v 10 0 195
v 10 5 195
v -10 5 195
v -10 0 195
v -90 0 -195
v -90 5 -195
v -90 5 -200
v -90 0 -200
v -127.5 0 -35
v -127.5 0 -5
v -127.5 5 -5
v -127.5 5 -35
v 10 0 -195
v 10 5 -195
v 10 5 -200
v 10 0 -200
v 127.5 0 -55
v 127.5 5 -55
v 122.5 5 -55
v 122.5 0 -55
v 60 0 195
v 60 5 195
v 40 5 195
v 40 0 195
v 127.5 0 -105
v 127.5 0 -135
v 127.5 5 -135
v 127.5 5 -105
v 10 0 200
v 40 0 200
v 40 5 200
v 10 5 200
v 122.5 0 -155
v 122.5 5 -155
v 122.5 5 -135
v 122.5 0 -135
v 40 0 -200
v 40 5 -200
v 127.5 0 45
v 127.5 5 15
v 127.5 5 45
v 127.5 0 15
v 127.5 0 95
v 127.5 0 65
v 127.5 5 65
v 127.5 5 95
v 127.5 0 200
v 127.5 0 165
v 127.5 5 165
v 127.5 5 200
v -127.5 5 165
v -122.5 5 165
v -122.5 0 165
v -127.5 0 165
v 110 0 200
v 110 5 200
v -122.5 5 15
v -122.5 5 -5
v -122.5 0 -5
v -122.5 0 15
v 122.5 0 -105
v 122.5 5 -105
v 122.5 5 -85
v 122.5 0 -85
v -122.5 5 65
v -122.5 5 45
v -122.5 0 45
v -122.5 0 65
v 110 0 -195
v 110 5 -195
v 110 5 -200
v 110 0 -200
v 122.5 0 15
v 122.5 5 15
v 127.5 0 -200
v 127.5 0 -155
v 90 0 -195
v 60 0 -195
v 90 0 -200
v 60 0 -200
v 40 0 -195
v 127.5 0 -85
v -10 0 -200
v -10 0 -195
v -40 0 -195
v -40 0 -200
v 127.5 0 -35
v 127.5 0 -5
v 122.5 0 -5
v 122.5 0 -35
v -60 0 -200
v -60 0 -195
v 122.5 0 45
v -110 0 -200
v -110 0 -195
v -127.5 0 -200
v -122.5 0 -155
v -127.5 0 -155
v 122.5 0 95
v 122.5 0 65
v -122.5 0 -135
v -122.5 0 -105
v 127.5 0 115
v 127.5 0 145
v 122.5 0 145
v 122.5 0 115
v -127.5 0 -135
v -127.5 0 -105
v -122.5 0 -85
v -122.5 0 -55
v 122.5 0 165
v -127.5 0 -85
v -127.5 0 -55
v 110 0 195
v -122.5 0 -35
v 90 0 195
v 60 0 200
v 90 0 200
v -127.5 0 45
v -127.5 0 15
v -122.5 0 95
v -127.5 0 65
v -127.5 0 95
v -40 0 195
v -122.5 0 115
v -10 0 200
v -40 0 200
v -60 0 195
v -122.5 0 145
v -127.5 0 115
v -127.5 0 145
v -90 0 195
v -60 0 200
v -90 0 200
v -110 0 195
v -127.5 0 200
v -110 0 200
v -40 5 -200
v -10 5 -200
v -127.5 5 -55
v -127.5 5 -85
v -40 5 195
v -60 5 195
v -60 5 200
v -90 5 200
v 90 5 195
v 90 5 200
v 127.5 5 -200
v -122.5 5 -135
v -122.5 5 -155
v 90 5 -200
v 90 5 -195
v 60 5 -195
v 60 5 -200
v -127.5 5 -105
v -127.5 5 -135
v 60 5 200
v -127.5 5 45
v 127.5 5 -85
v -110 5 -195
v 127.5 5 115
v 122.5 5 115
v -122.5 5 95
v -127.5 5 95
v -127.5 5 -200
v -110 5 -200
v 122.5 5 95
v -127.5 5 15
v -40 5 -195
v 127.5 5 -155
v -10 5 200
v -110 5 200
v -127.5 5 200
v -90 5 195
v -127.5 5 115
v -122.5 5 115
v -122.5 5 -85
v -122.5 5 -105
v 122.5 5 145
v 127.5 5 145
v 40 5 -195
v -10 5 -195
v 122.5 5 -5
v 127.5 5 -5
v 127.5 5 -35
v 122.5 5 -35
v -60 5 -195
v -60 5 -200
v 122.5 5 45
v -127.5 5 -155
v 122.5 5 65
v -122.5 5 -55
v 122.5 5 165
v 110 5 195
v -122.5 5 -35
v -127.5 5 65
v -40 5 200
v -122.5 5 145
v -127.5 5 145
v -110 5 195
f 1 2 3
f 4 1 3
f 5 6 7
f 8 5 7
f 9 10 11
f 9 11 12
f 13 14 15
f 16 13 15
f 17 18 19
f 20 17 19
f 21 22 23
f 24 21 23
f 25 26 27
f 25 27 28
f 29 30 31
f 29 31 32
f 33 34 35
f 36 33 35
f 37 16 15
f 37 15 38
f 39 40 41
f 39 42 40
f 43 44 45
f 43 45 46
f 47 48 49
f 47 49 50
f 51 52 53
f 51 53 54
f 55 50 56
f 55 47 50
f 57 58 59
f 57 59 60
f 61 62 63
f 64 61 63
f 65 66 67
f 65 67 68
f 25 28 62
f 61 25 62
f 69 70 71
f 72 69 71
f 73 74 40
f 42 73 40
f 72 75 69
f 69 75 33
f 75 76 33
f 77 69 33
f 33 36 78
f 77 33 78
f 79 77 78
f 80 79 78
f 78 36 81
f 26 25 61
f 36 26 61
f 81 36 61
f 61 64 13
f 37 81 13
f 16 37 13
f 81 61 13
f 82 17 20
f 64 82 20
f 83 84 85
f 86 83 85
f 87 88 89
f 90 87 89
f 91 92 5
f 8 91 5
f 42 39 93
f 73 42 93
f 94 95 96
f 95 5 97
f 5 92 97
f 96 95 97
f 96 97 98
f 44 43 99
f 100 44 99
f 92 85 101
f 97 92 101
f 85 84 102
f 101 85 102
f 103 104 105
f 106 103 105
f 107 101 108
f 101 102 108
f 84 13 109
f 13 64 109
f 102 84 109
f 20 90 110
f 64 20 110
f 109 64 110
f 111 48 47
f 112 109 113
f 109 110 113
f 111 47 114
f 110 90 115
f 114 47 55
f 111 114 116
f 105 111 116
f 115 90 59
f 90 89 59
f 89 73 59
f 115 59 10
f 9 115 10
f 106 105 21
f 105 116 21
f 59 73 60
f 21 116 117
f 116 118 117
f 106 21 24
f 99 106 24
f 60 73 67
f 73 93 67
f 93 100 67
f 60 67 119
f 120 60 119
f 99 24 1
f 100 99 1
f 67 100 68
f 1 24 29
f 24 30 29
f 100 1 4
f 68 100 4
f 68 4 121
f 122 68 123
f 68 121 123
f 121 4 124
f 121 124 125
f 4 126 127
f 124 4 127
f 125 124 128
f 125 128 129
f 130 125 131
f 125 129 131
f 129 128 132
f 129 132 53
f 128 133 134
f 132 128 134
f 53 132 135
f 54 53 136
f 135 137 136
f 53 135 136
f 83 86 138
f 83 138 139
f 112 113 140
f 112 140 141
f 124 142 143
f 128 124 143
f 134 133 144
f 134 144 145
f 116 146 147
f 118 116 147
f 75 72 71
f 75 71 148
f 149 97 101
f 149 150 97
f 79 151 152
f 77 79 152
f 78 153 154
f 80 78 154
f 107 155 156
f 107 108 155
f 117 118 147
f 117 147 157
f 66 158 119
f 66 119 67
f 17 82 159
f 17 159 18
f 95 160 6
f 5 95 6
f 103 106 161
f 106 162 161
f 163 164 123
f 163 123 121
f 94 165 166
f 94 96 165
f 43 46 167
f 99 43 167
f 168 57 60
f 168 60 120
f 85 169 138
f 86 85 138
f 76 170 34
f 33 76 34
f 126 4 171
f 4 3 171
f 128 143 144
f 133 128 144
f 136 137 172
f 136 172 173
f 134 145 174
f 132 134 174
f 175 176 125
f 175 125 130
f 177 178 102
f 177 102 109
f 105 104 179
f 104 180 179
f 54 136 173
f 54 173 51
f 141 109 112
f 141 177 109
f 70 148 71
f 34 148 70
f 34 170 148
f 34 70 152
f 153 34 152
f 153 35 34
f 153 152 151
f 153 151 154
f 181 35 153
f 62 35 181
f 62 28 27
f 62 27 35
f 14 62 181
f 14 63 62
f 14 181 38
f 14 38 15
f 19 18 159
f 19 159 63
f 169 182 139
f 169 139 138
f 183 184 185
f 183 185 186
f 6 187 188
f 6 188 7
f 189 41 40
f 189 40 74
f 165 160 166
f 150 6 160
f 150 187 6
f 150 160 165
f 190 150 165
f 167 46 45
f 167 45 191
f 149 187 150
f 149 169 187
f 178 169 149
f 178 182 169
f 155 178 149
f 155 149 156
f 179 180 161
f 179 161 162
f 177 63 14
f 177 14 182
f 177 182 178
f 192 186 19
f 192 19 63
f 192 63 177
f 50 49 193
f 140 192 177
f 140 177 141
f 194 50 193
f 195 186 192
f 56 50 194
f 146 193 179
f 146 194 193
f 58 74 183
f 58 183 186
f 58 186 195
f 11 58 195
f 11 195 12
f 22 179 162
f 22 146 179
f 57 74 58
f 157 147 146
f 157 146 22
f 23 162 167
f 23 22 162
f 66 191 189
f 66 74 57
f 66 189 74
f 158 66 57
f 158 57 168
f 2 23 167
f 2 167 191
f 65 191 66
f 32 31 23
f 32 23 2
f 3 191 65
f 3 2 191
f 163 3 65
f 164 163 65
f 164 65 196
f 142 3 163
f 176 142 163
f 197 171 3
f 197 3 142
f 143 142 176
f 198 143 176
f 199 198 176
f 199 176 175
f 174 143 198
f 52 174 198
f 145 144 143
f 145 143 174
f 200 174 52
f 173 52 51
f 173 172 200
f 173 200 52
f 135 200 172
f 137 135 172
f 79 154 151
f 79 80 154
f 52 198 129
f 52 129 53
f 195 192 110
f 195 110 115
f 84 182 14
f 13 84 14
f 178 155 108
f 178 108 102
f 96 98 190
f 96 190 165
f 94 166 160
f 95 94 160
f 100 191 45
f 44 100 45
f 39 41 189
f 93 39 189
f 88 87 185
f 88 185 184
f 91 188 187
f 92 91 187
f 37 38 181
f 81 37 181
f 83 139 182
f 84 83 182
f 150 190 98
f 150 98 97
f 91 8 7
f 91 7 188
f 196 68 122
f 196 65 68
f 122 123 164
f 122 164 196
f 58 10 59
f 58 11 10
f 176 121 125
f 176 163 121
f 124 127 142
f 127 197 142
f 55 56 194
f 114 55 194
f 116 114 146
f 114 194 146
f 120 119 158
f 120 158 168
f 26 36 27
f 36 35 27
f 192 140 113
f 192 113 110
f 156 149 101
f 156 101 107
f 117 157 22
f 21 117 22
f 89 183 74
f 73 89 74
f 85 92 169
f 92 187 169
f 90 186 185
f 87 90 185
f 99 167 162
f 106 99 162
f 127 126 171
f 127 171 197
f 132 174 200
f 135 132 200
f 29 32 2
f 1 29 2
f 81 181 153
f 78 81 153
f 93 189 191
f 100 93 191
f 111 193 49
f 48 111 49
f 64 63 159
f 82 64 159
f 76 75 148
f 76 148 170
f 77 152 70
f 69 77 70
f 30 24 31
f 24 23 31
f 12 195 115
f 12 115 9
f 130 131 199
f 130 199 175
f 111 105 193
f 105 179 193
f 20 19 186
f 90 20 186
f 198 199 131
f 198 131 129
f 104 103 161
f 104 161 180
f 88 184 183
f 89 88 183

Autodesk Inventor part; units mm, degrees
ref_plane "YZ Plane" through (0, 0, 0) normal (1, 0, 0) x (0, 1, 0)
ref_plane "XZ Plane" through (0, 0, 0) normal (0, 1, 0) x (-1, 0, 0)
ref_plane "XY Plane" through (0, 0, 0) normal (0, 0, 1) x (1, 0, 0)
sketch "Sketch1" plane through (0, 0, 0) normal (0, 1, 0) x (-1, 0, 0)
  line L0 (127.5, -200) -> (-127.5, -200)
  line L1 (-127.5, -200) -> (-127.5, 200)
  line L2 (-127.5, 200) -> (127.5, 200)
  line L3 (127.5, 200) -> (127.5, -200)
  line L4 (127.5, -200) -> (-127.5, 200) construction
  line L5 (-127.5, -200) -> (127.5, 200) construction
  point P0 (0, 0)
  dimension "d0" = 255
  dimension "d1" = 400
extrude "base" add sketch "Sketch1" along normal blind 5
sketch "Sketch5" plane through (0, 5, 0) normal (0, 1, 0) x (1, 0, 0)
  line L0 (-127.5, -200) -> (127.5, -200) projected
  line L1 (-110, -200) -> (-90, -200)
  line L2 (-90, -200) -> (-90, -195)
  line L3 (-90, -195) -> (-110, -195)
  line L4 (-110, -195) -> (-110, -200)
  line L5 (-60, -200) -> (-40, -200)
  line L6 (-40, -200) -> (-40, -195)
  line L7 (-40, -195) -> (-60, -195)
  line L8 (-60, -195) -> (-60, -200)
  line L9 (-10, -200) -> (10, -200)
  line L10 (10, -200) -> (10, -195)
  line L11 (10, -195) -> (-10, -195)
  line L12 (-10, -195) -> (-10, -200)
  line L13 (40, -200) -> (60, -200)
  line L14 (60, -200) -> (60, -195)
  line L15 (60, -195) -> (40, -195)
  line L16 (40, -195) -> (40, -200)
  line L17 (90, -200) -> (110, -200)
  line L18 (110, -200) -> (110, -195)
  line L19 (110, -195) -> (90, -195)
  line L20 (90, -195) -> (90, -200)
  line L21 (-110, 200) -> (-110, 195)
  line L22 (-90, 200) -> (-110, 200)
  line L23 (-110, 195) -> (-90, 195)
  line L24 (-90, 195) -> (-90, 200)
  line L25 (-60, 200) -> (-60, 195)
  line L26 (-40, 200) -> (-60, 200)
  line L27 (-40, 195) -> (-40, 200)
  line L28 (-10, 200) -> (-10, 195)
  line L29 (10, 200) -> (-10, 200)
  line L30 (10, 195) -> (10, 200)
  line L31 (-10, 195) -> (10, 195)
  line L32 (-60, 195) -> (-40, 195)
  line L33 (40, 200) -> (40, 195)
  line L34 (40, 195) -> (60, 195)
  line L35 (60, 200) -> (40, 200)
  line L36 (60, 195) -> (60, 200)
  line L37 (90, 200) -> (90, 195)
  line L38 (90, 195) -> (110, 195)
  line L39 (110, 200) -> (90, 200)
  line L40 (110, 195) -> (110, 200)
  point P0 (0, 0)
  point P1 (90, -200)
  point P2 (110, -200)
  point P3 (-10, -200)
  point P4 (10, -200)
  point P5 (-60, -200)
  point P6 (-40, -200)
  point P7 (40, -200)
  point P8 (60, -200)
  dimension "d36" = 20
  dimension "d37" = 5
  dimension "d40" = 50
  dimension "d45" = 17.5
  dimension "d46" = 17.5
  dimension "d49" = 395
extrude "Extrusion4" cut sketch "Sketch5" against normal blind 5
sketch "Sketch8" plane through (0, 5, 0) normal (0, 1, 0) x (1, 0, 0)
  line L0 (-127.5, 200) -> (-127.5, -200) projected
  line L1 (-127.5, -145) -> (-122.5, -145)
  line L2 (-122.5, -145) -> (-122.5, -165)
  line L3 (-122.5, -165) -> (-127.5, -165)
  line L4 (-127.5, -165) -> (-127.5, -145)
  line L5 (-127.5, -95) -> (-122.5, -95)
  line L6 (-122.5, -95) -> (-122.5, -115)
  line L7 (-122.5, -115) -> (-127.5, -115)
  line L8 (-127.5, -115) -> (-127.5, -95)
  line L9 (-127.5, -45) -> (-122.5, -45)
  line L10 (-122.5, -45) -> (-122.5, -65)
  line L11 (-122.5, -65) -> (-127.5, -65)
  line L12 (-127.5, -65) -> (-127.5, -45)
  line L13 (-127.5, 5) -> (-122.5, 5)
  line L14 (-122.5, 5) -> (-122.5, -15)
  line L15 (-122.5, -15) -> (-127.5, -15)
  line L16 (-127.5, -15) -> (-127.5, 5)
  line L17 (-127.5, 55) -> (-122.5, 55)
  line L18 (-122.5, 55) -> (-122.5, 35)
  line L19 (-122.5, 35) -> (-127.5, 35)
  line L20 (-127.5, 35) -> (-127.5, 55)
  line L21 (-127.5, 105) -> (-122.5, 105)
  line L22 (-122.5, 105) -> (-122.5, 85)
  line L23 (-122.5, 85) -> (-127.5, 85)
  line L24 (-127.5, 85) -> (-127.5, 105)
  line L25 (-127.5, 155) -> (-122.5, 155)
  line L26 (-122.5, 155) -> (-122.5, 135)
  line L27 (-122.5, 135) -> (-127.5, 135)
  line L28 (-127.5, 135) -> (-127.5, 155)
  line L29 (0, 0) -> (0, -33.5633)
  line L30 (127.5, -145) -> (122.5, -145)
  line L31 (122.5, -145) -> (122.5, -165)
  line L32 (122.5, -165) -> (127.5, -165)
  line L33 (127.5, -165) -> (127.5, -145)
  line L34 (127.5, -95) -> (122.5, -95)
  line L35 (122.5, -95) -> (122.5, -115)
  line L36 (122.5, -115) -> (127.5, -115)
  line L37 (127.5, -115) -> (127.5, -95)
  line L38 (127.5, -45) -> (122.5, -45)
  line L39 (122.5, -45) -> (122.5, -65)
  line L40 (122.5, -65) -> (127.5, -65)
  line L41 (127.5, -65) -> (127.5, -45)
  line L42 (127.5, 5) -> (122.5, 5)
  line L43 (122.5, 5) -> (122.5, -15)
  line L44 (122.5, -15) -> (127.5, -15)
  line L45 (127.5, -15) -> (127.5, 5)
  line L46 (127.5, 55) -> (122.5, 55)
  line L47 (122.5, 55) -> (122.5, 35)
  line L48 (122.5, 35) -> (127.5, 35)
  line L49 (127.5, 35) -> (127.5, 55)
  line L50 (127.5, 105) -> (122.5, 105)
  line L51 (122.5, 105) -> (122.5, 85)
  line L52 (122.5, 85) -> (127.5, 85)
  line L53 (127.5, 85) -> (127.5, 105)
  line L54 (127.5, 155) -> (122.5, 155)
  line L55 (122.5, 155) -> (122.5, 135)
  line L56 (122.5, 135) -> (127.5, 135)
  line L57 (127.5, 135) -> (127.5, 155)
  dimension "d82" = 5
  dimension "d83" = 20
  dimension "d84" = 35
  dimension "d87" = 50
extrude "Extrusion7" cut sketch "Sketch8" against normal blind 5
properties part number "base inferior"
